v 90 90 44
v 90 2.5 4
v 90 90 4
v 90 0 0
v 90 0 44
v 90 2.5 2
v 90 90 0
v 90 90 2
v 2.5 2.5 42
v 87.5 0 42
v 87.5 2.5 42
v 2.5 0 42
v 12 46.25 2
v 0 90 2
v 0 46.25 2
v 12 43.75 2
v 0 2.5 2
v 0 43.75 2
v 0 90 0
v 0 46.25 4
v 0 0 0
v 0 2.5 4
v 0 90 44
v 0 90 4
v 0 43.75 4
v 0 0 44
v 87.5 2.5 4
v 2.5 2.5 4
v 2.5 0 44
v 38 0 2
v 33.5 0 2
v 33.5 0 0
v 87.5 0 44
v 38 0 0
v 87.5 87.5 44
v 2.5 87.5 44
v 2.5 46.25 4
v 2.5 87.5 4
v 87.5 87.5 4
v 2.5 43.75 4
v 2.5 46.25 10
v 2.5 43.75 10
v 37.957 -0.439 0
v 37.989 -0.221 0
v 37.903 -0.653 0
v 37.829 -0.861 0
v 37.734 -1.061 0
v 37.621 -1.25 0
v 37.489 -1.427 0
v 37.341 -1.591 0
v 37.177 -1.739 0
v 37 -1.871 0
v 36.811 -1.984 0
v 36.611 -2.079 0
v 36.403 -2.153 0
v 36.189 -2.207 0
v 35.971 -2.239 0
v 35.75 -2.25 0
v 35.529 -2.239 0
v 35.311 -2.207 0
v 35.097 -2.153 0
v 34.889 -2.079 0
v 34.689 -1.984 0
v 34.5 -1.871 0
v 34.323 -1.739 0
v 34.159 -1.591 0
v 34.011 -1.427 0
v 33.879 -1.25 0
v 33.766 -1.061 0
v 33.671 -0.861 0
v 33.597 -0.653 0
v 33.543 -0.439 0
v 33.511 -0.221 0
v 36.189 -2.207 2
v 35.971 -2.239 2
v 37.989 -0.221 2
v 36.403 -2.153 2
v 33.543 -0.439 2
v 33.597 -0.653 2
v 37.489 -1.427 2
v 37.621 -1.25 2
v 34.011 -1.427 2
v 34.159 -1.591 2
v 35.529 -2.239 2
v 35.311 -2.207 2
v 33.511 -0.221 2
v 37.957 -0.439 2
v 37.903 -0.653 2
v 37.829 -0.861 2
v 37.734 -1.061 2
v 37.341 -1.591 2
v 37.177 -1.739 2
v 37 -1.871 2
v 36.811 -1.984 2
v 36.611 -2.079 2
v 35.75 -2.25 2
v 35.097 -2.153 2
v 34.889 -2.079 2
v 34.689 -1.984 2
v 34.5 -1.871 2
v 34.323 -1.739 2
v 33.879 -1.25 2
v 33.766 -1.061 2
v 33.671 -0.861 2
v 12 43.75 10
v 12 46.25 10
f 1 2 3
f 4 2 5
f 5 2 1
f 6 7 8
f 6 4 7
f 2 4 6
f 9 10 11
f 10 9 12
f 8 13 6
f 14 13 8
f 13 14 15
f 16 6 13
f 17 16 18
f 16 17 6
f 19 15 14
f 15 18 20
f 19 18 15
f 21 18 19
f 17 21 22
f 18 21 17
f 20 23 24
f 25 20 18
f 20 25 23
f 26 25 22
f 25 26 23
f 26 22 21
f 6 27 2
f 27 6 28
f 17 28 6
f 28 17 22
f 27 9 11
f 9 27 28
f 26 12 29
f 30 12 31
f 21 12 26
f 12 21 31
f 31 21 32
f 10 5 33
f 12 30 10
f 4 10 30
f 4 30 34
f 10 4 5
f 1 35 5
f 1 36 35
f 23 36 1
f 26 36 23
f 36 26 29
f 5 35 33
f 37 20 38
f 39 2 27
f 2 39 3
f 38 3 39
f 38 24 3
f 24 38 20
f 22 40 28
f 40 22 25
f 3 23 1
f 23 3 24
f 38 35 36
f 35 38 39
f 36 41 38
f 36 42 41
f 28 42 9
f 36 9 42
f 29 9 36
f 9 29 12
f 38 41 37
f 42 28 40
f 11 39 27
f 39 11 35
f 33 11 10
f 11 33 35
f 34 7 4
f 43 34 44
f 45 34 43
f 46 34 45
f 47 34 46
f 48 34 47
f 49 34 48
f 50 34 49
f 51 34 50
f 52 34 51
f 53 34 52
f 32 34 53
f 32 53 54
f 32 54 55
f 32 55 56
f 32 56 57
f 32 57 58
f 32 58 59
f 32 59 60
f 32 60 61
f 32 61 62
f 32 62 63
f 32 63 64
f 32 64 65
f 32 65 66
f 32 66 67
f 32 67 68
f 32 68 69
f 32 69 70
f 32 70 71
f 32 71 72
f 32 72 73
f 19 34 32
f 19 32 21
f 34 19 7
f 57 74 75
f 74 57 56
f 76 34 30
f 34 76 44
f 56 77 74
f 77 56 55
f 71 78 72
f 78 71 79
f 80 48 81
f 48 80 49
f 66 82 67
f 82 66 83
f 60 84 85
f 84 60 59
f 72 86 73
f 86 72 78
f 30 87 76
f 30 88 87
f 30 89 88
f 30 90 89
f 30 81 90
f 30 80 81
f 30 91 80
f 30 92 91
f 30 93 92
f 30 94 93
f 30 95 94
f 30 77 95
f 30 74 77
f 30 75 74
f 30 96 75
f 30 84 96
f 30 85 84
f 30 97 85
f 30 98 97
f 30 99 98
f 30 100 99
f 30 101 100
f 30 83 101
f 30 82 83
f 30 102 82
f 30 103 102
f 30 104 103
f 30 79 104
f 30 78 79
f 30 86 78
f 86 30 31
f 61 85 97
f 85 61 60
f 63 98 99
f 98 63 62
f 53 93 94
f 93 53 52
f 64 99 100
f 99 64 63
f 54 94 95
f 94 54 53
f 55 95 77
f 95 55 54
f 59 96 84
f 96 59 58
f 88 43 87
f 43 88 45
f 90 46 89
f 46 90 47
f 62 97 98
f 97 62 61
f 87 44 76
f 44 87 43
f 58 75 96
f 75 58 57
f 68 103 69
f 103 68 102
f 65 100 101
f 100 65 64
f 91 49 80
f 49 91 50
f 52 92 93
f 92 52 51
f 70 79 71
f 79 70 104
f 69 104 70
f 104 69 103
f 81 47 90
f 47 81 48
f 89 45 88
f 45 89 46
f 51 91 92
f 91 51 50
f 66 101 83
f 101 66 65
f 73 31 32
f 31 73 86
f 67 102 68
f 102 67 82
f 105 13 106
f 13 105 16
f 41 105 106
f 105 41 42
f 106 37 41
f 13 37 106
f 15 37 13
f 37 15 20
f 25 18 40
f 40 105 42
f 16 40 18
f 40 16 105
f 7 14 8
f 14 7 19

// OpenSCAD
// Variables for dimensions
outer_size_x = 90;  // Outer size in X direction
outer_size_y = 90;  // Outer size in Y direction
top_plate_thickness = 2;  // Thickness of the top plate
wall_thickness = 2.5;  // Thickness of the walls
wall_height = 40;  // Height of the walls from the top plate
screw_hole_diameter = 4.5;  // Diameter of screw holes
screw_pattern_distance = 71.5;  // Distance between screw holes in square pattern
notch_width = 12;  // Width of the cable notch
notch_depth = 8;  // Depth of the cable notch from the open edge

// Main housing
union() {
  // Top plate (lying on the bed, z=0 to z=2)
  cube([outer_size_x, outer_size_y, top_plate_thickness], center=false);

  // Walls rising from the top plate
  translate([0, 0, top_plate_thickness]) {
    // Front wall
    cube([outer_size_x, wall_thickness, wall_height], center=false);
    // Back wall
    translate([0, outer_size_y - wall_thickness, top_plate_thickness]) {
      cube([outer_size_x, wall_thickness, wall_height], center=false);
    }
    // Left wall
    translate([0, 0, top_plate_thickness]) {
      cube([wall_thickness, outer_size_y, wall_height], center=false);
    }
    // Right wall
    translate([outer_size_x - wall_thickness, 0, top_plate_thickness]) {
      cube([wall_thickness, outer_size_y, wall_height], center=false);
    }
  }

  // Screw holes in the top plate
  for (i = [0:3]) {
    // Calculate positions for square pattern
    x = (screw_pattern_distance / 2) * (1 - 2 * i % 2);
    y = (screw_pattern_distance / 2) * (1 - 2 * (i / 2) % 2);
    translate([x, y, 0]) {
      cylinder(r = screw_hole_diameter / 2, h = top_plate_thickness, $fn=64);
    }
  }

  // Cable notch in the front wall
  translate([0, (outer_size_y - wall_thickness) / 2, top_plate_thickness]) {
    // Notch depth is 8 mm from open edge (z=32 to z=40)
    // So we cut from z=32 to z=40, which is 8 mm deep
    // Notch is 12 mm wide and 8 mm deep, centered along the wall
    difference() {
      // Create a rectangular block for the notch
      cube([notch_width, wall_thickness, 8], center=false);
      // Cut a square hole in the middle of the notch block
      translate([notch_width / 2 - 1, 0, 32]) {
        cube([2, 2, 8], center=false);
      }
    }
  }
}
